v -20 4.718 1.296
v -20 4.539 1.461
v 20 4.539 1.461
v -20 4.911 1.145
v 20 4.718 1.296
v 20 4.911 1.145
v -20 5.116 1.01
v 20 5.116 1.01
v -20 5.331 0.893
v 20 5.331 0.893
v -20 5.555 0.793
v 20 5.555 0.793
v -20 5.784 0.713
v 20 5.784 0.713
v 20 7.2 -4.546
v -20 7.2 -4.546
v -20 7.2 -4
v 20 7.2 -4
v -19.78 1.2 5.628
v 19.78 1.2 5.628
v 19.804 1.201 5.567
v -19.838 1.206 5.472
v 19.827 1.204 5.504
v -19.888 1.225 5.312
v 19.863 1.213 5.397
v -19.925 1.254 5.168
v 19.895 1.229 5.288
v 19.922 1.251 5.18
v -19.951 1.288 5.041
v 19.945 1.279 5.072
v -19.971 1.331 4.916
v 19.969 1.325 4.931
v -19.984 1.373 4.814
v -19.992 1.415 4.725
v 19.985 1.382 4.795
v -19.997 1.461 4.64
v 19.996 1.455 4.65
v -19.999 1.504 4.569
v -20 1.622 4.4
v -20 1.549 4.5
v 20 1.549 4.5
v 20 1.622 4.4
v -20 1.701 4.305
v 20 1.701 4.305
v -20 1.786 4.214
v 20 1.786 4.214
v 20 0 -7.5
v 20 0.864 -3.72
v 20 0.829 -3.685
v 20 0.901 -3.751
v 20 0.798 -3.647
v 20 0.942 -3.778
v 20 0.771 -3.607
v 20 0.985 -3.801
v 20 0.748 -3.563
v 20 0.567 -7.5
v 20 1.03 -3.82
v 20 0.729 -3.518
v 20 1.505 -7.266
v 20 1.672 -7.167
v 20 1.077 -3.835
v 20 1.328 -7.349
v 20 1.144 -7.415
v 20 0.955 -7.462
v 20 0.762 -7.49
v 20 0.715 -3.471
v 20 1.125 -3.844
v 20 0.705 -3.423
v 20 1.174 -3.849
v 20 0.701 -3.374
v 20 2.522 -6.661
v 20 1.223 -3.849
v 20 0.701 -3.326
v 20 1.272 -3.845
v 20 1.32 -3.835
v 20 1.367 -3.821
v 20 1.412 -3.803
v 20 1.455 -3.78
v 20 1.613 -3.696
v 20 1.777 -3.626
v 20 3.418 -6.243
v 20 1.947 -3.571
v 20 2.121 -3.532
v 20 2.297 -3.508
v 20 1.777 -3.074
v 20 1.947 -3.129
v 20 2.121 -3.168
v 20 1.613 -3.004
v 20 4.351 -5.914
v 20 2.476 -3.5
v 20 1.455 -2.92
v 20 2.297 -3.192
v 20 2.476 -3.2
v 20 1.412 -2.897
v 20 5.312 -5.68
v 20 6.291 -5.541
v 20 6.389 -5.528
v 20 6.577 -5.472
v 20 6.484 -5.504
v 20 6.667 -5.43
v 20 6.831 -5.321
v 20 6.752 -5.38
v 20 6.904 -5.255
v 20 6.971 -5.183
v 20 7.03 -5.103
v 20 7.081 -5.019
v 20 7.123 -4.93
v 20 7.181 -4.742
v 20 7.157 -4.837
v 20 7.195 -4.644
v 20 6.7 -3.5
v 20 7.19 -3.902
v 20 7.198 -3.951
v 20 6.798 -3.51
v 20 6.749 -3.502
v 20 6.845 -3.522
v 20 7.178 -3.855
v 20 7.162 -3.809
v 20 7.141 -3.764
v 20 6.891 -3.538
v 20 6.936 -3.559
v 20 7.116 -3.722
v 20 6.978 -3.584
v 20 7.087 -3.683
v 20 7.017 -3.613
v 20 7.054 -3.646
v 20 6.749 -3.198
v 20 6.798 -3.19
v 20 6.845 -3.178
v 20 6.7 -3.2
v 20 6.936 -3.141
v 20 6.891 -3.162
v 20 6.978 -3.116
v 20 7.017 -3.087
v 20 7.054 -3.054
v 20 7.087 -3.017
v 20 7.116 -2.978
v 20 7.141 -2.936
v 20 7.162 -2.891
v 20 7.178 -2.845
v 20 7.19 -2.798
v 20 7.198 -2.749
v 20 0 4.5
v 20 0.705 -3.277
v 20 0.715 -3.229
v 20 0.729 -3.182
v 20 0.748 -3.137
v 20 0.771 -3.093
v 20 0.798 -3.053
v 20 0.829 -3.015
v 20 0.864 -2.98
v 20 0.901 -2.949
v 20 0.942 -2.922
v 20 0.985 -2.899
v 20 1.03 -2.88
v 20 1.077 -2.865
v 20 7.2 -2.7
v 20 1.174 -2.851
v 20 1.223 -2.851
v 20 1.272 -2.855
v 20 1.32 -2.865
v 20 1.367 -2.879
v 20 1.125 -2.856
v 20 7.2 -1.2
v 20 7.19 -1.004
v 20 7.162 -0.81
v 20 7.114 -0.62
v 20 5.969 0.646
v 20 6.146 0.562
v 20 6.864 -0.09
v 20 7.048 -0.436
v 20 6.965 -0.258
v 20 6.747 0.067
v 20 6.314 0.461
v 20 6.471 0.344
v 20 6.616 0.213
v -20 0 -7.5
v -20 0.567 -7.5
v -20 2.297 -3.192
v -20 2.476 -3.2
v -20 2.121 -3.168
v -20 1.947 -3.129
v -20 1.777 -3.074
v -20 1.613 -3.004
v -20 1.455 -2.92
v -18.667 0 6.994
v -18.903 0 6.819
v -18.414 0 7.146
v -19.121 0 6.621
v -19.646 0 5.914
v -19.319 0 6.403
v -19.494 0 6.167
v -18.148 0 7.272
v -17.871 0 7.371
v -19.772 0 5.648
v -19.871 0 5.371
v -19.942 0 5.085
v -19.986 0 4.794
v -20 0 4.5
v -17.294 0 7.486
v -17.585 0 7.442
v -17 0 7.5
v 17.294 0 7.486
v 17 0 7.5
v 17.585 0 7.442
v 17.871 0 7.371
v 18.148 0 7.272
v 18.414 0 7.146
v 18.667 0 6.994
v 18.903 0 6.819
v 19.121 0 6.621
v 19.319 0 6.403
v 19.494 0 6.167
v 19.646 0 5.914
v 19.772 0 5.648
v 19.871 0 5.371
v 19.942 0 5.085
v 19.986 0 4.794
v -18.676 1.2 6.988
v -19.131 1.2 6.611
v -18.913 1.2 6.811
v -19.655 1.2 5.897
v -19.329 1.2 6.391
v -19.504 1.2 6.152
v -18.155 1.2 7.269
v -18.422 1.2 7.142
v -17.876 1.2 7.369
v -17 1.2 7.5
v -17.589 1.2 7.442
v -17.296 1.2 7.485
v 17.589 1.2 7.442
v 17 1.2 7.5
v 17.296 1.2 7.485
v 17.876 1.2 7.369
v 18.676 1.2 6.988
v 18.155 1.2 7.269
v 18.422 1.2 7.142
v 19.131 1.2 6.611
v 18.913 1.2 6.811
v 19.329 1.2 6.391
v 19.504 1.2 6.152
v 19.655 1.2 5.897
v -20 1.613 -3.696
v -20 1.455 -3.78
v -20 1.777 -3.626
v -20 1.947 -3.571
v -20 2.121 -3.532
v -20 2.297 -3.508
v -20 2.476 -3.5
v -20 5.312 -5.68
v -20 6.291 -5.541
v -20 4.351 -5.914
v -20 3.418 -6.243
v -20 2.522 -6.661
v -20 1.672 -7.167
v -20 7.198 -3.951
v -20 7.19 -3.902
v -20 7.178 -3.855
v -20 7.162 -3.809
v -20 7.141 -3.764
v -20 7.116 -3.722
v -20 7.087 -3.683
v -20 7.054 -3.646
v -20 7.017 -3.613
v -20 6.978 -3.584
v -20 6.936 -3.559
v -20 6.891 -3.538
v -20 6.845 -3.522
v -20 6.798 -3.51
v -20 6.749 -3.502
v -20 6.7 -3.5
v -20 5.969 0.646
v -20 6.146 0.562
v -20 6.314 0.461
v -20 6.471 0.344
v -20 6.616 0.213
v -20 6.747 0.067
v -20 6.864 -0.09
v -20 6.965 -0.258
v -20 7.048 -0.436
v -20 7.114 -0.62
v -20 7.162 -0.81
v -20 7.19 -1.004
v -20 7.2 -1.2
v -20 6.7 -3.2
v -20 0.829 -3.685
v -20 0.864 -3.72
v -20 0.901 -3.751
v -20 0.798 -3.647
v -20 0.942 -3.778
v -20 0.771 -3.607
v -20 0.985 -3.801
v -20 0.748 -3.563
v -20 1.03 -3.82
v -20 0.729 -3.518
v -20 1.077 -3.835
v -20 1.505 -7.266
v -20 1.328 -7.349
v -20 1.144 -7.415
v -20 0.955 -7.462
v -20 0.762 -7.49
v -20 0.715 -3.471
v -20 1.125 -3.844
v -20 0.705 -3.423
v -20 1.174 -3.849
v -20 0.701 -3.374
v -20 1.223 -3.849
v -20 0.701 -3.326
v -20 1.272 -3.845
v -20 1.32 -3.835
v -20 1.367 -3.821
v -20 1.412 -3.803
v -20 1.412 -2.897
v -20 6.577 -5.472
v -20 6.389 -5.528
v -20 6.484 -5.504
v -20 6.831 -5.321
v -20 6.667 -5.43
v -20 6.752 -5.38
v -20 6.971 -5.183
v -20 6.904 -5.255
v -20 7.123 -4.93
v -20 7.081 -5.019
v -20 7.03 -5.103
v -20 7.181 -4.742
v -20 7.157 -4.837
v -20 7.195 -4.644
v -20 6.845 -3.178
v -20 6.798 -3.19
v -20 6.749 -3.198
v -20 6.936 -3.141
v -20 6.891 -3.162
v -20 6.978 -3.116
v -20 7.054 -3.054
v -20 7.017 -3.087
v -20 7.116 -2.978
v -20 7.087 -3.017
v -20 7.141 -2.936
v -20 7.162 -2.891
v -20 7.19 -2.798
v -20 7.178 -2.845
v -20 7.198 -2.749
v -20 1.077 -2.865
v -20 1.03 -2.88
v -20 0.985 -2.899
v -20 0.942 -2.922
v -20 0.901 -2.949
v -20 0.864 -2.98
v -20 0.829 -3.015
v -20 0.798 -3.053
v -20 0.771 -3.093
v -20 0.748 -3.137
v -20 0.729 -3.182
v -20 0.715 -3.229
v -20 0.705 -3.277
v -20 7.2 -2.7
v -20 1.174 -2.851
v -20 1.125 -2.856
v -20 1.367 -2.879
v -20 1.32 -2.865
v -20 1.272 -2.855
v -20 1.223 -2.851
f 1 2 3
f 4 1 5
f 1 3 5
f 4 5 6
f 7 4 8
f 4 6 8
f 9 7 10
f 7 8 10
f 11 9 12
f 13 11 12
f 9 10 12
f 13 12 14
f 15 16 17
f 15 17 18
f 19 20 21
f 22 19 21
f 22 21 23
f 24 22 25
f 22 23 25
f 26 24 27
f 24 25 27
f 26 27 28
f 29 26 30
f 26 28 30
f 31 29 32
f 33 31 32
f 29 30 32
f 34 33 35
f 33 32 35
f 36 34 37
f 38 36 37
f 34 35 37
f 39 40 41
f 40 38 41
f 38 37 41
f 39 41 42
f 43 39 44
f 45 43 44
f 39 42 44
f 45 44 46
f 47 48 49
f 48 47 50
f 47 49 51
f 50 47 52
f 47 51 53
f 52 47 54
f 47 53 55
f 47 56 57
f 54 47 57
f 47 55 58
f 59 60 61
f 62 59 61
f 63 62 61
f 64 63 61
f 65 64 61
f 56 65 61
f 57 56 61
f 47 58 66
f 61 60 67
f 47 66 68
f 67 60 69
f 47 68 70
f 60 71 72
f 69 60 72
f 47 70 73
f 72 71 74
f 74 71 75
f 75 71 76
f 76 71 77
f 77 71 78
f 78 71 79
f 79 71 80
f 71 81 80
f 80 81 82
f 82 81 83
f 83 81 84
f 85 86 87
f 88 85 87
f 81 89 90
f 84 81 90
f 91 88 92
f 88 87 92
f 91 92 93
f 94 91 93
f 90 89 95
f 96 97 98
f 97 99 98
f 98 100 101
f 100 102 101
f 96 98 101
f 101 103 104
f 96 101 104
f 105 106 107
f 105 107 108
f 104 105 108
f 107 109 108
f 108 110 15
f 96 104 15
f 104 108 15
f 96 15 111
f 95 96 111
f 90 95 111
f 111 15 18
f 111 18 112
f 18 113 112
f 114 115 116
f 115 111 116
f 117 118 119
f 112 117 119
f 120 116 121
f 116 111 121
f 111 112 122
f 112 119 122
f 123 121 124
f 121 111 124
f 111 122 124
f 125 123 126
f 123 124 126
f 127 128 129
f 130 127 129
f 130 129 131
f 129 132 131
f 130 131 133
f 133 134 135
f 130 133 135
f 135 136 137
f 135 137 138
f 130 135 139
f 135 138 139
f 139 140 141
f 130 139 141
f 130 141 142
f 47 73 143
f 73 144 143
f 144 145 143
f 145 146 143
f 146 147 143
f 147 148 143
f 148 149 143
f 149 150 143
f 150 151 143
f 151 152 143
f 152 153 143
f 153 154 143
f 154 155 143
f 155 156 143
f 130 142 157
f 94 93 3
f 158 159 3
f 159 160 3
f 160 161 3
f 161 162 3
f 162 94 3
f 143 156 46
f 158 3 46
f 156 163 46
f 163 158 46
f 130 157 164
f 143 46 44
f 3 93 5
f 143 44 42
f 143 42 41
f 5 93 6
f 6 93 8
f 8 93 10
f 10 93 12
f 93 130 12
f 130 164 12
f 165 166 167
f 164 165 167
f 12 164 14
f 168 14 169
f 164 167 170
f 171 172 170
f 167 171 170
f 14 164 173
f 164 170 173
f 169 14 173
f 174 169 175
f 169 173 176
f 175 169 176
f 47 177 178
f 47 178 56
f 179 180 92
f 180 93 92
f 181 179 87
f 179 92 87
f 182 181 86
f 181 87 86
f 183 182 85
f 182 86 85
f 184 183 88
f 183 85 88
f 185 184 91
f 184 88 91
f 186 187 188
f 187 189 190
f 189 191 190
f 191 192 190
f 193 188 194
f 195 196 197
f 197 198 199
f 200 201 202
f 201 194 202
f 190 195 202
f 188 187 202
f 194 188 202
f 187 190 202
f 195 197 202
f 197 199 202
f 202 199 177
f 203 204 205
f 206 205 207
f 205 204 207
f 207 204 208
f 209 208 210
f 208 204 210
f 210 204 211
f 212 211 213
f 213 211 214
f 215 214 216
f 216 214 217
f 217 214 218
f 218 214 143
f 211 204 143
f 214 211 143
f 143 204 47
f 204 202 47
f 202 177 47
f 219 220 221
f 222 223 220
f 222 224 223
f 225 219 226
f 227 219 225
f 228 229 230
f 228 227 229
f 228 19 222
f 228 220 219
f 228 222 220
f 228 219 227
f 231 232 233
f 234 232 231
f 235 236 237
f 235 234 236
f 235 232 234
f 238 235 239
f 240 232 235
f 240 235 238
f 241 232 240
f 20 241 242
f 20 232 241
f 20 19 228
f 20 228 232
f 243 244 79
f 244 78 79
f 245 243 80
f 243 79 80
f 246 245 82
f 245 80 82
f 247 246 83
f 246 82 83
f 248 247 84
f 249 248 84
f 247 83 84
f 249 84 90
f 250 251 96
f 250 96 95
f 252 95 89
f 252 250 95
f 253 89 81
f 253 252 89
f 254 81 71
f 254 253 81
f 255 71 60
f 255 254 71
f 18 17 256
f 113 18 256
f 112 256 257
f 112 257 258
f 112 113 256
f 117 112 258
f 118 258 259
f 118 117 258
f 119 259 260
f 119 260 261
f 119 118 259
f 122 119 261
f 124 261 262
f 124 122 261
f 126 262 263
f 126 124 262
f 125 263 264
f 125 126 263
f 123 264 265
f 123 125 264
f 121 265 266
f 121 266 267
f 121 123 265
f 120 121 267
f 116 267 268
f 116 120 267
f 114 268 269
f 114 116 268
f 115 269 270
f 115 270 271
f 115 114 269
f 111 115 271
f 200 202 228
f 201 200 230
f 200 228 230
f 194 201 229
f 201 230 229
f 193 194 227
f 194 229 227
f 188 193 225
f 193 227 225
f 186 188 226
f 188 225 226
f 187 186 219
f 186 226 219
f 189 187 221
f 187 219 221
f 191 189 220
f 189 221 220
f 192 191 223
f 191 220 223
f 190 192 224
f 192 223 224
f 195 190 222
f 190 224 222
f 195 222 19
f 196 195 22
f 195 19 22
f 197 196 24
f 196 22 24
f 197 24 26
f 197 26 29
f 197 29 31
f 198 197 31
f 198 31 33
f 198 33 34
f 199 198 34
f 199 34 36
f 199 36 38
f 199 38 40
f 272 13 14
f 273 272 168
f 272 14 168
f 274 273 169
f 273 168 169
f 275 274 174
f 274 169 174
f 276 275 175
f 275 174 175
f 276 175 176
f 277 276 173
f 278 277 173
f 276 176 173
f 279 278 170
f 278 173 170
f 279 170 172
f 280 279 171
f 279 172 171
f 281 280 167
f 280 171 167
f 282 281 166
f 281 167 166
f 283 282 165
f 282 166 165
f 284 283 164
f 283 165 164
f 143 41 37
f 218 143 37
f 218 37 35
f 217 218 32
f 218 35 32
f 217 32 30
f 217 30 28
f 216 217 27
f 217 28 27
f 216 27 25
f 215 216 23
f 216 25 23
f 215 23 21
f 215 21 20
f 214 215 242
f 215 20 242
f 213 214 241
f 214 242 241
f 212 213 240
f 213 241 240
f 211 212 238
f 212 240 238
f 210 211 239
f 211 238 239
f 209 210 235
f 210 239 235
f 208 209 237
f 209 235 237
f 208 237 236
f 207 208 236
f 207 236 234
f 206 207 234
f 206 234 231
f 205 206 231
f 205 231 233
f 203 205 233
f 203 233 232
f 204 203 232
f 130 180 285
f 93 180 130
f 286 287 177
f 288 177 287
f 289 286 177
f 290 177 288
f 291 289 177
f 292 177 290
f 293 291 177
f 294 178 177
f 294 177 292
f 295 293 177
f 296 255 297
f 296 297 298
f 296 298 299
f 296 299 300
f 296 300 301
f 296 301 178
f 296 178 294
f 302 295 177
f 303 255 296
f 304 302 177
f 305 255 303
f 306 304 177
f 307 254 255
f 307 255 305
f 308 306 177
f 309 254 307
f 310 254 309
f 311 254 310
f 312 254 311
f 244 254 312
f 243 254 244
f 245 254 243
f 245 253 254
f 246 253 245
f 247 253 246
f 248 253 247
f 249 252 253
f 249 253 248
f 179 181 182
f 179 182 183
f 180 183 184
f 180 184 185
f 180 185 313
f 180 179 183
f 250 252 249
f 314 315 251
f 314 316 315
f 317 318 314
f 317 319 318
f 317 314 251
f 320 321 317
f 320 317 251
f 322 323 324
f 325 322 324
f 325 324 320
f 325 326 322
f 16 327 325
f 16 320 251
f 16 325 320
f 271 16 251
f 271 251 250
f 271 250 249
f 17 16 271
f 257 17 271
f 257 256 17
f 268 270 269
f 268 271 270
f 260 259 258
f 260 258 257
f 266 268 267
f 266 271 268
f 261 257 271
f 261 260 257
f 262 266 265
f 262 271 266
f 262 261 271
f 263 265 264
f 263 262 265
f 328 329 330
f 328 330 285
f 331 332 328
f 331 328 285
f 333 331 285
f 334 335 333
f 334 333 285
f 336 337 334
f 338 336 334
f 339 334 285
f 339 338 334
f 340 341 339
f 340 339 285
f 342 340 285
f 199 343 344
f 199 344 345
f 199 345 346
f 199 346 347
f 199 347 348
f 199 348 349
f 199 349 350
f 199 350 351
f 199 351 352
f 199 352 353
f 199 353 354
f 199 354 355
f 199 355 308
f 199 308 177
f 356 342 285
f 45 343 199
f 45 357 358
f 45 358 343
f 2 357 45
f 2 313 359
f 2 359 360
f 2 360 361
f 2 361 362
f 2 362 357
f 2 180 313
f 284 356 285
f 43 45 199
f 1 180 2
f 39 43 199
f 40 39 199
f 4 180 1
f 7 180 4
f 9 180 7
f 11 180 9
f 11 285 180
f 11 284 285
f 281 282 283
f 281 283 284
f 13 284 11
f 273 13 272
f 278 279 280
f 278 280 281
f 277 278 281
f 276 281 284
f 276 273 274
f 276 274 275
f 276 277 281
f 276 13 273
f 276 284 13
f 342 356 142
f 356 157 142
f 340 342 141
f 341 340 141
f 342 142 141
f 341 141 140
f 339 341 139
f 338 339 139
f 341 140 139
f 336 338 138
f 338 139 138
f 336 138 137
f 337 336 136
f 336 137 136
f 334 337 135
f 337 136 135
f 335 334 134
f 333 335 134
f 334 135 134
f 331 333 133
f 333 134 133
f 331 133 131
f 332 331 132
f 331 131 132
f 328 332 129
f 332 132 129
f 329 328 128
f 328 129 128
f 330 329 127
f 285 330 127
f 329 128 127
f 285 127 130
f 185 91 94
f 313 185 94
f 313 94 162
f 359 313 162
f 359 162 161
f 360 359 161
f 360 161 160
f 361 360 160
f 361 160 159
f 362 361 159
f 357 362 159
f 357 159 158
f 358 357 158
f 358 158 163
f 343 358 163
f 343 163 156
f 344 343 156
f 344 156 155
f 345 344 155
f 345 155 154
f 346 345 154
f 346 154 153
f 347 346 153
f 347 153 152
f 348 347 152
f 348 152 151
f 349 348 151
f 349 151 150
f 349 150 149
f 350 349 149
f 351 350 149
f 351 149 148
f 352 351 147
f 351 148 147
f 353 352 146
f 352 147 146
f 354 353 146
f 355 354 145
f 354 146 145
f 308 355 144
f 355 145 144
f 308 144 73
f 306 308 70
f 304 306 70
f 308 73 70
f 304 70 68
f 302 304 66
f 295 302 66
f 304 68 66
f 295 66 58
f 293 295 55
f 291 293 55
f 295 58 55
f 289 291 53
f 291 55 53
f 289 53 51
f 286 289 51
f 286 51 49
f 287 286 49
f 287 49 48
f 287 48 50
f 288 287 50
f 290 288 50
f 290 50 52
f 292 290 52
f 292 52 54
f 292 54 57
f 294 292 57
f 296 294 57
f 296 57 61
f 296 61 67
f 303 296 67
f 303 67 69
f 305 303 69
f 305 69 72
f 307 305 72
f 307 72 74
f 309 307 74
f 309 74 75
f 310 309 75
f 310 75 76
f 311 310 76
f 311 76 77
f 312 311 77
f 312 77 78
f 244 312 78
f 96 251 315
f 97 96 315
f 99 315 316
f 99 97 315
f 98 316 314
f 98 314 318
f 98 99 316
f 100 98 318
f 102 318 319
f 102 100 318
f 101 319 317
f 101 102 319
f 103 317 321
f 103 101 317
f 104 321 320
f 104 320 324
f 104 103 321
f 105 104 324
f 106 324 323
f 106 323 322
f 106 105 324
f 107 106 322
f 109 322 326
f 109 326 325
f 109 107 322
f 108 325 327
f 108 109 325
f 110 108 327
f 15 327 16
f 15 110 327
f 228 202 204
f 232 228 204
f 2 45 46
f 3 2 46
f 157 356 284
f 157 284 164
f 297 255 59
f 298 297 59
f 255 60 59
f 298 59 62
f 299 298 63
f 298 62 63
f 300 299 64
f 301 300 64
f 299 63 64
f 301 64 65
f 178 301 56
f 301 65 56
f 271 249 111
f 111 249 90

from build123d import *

# Parameters (mm, degrees)
SKETCH_1_W          = 40
SKETCH_1_H          = 15
EXTRUDE_1_DEPTH     = 1.2
SKETCH_2_W          = 40
SKETCH_2_H          = 2
SKETCH_2_H_2        = 4
EXTRUDE_2_DEPTH     = 6
FILLET_1_R          = 10
CHAMFER_1_SIZE      = 4
FILLET_2_R          = 2
FILLET_3_R          = 0.5
CUT_EXTRUDE_1_REACH = 43.329
SKETCH_3_R          = 0.5
FILLET_4_R          = 1
FILLET_5_R          = 2
FILLET_6_R          = 3
FILLET_7_R          = 2
FILLET_8_R          = 3


# Some blends are built 0.0001 mm under size
with BuildPart() as part:
    # 草图1 → 凸台-拉伸1 (new body)
    with BuildSketch(Plane(origin=(0, 0, 0), x_dir=(1, 0, 0), z_dir=(0, 1, 0))):
        Rectangle(SKETCH_1_W, SKETCH_1_H)
    extrude(amount=EXTRUDE_1_DEPTH)

    # 草图2 → 凸台-拉伸2 (add)
    with BuildSketch(Plane(origin=(0, 1.2, 0), x_dir=(1, 0, 0), z_dir=(0, 1, 0))):
        with Locations((0, 4.5)):
            Rectangle(SKETCH_2_W, SKETCH_2_H)
        with Locations((0, 1.2)):
            Rectangle(SKETCH_2_W, SKETCH_2_H_2)
    extrude(amount=EXTRUDE_2_DEPTH)

    # 圆角1
    # the kernel refuses this fillet: 10 mm, written as the material it adds along each edge
    with BuildSketch(Plane(origin=(-20, 1.2, -5.5), x_dir=(0, 0, -1), z_dir=(1, 0, 0))) as fillet_1_piece_1:
        with BuildLine():
            CenterArc((10, 6), FILLET_1_R, 180, 36.869897646)
            Line((0, 6), (-0.2, 6))
            Line((-0.2, 6), (-0.2, 0))
            Line((-0.2, 0), (0, -0.2))
            ThreePointArc((0, -0.2), (1, -0.2), (1.84, -0.12))
            Line((1.84, -0.12), (2, 0))
        make_face()
    extrude(amount=40)

    # 倒角1
    chamfer_1_edges = [part.edges().sort_by_distance(p)[0] for p in [
        (0, 1.2, 0.8),
    ]]
    chamfer(chamfer_1_edges, length=CHAMFER_1_SIZE)

    # 圆角2
    fillet_2_edges = [part.edges().sort_by_distance(p)[0] for p in [
        (0, 1.2, 4.8),
        (0, 7.2, 0.8),
    ]]
    fillet(fillet_2_edges, radius=FILLET_2_R - 0.0001)  # a hair under: the kernel refuses the full size

    # 圆角3
    fillet_3_edges = [part.edges().sort_by_distance(p)[0] for p in [
        (0, 7.2, -3.5),
        (0, 7.2, -3.2),
    ]]
    fillet(fillet_3_edges, radius=FILLET_3_R)

    # 草图3 → 切除-拉伸1 (cut, up to next)
    with BuildSketch(Plane(origin=(20, 0, 0), x_dir=(0, 0, -1), z_dir=(1, 0, 0)), mode=Mode.PRIVATE) as cut_extrude_1_sk1:
        with Locations((3.35, 1.2)):
            Circle(SKETCH_3_R)
    cut_extrude_1_tool1 = extrude(cut_extrude_1_sk1.sketch, amount=-CUT_EXTRUDE_1_REACH, mode=Mode.PRIVATE) & part.part
    add(cut_extrude_1_tool1.solids().sort_by_distance((20, 1.2, -3.35))[0], mode=Mode.SUBTRACT)

    # 圆角4
    fillet_4_edges = [part.edges().sort_by_distance(p)[0] for p in [
        (0, 7.2, -5.5),
    ]]
    fillet(fillet_4_edges, radius=FILLET_4_R)

    # 圆角5
    fillet_5_edges = [part.edges().sort_by_distance(p)[0] for p in [
        (0, 1.2, -7.5),
    ]]
    fillet(fillet_5_edges, radius=FILLET_5_R)

    # 圆角6
    fillet_6_edges = [part.edges().sort_by_distance(p)[0] for p in [
        (0, 5.2, 0.8),
    ]]
    fillet(fillet_6_edges, radius=FILLET_6_R)

    # 圆角7
    fillet_7_edges = [part.edges().sort_by_distance(p)[0] for p in [
        (0, 1.676969601, -3.5),
        (0, 1.676969601, -3.2),
    ]]
    fillet(fillet_7_edges, radius=FILLET_7_R)

    # 圆角8
    fillet_8_edges = [part.edges().sort_by_distance(p)[0] for p in [
        (20, 0.6, 7.5),
        (-20, 0.6, 7.5),
    ]]
    fillet(fillet_8_edges, radius=FILLET_8_R)


solid = part.part
